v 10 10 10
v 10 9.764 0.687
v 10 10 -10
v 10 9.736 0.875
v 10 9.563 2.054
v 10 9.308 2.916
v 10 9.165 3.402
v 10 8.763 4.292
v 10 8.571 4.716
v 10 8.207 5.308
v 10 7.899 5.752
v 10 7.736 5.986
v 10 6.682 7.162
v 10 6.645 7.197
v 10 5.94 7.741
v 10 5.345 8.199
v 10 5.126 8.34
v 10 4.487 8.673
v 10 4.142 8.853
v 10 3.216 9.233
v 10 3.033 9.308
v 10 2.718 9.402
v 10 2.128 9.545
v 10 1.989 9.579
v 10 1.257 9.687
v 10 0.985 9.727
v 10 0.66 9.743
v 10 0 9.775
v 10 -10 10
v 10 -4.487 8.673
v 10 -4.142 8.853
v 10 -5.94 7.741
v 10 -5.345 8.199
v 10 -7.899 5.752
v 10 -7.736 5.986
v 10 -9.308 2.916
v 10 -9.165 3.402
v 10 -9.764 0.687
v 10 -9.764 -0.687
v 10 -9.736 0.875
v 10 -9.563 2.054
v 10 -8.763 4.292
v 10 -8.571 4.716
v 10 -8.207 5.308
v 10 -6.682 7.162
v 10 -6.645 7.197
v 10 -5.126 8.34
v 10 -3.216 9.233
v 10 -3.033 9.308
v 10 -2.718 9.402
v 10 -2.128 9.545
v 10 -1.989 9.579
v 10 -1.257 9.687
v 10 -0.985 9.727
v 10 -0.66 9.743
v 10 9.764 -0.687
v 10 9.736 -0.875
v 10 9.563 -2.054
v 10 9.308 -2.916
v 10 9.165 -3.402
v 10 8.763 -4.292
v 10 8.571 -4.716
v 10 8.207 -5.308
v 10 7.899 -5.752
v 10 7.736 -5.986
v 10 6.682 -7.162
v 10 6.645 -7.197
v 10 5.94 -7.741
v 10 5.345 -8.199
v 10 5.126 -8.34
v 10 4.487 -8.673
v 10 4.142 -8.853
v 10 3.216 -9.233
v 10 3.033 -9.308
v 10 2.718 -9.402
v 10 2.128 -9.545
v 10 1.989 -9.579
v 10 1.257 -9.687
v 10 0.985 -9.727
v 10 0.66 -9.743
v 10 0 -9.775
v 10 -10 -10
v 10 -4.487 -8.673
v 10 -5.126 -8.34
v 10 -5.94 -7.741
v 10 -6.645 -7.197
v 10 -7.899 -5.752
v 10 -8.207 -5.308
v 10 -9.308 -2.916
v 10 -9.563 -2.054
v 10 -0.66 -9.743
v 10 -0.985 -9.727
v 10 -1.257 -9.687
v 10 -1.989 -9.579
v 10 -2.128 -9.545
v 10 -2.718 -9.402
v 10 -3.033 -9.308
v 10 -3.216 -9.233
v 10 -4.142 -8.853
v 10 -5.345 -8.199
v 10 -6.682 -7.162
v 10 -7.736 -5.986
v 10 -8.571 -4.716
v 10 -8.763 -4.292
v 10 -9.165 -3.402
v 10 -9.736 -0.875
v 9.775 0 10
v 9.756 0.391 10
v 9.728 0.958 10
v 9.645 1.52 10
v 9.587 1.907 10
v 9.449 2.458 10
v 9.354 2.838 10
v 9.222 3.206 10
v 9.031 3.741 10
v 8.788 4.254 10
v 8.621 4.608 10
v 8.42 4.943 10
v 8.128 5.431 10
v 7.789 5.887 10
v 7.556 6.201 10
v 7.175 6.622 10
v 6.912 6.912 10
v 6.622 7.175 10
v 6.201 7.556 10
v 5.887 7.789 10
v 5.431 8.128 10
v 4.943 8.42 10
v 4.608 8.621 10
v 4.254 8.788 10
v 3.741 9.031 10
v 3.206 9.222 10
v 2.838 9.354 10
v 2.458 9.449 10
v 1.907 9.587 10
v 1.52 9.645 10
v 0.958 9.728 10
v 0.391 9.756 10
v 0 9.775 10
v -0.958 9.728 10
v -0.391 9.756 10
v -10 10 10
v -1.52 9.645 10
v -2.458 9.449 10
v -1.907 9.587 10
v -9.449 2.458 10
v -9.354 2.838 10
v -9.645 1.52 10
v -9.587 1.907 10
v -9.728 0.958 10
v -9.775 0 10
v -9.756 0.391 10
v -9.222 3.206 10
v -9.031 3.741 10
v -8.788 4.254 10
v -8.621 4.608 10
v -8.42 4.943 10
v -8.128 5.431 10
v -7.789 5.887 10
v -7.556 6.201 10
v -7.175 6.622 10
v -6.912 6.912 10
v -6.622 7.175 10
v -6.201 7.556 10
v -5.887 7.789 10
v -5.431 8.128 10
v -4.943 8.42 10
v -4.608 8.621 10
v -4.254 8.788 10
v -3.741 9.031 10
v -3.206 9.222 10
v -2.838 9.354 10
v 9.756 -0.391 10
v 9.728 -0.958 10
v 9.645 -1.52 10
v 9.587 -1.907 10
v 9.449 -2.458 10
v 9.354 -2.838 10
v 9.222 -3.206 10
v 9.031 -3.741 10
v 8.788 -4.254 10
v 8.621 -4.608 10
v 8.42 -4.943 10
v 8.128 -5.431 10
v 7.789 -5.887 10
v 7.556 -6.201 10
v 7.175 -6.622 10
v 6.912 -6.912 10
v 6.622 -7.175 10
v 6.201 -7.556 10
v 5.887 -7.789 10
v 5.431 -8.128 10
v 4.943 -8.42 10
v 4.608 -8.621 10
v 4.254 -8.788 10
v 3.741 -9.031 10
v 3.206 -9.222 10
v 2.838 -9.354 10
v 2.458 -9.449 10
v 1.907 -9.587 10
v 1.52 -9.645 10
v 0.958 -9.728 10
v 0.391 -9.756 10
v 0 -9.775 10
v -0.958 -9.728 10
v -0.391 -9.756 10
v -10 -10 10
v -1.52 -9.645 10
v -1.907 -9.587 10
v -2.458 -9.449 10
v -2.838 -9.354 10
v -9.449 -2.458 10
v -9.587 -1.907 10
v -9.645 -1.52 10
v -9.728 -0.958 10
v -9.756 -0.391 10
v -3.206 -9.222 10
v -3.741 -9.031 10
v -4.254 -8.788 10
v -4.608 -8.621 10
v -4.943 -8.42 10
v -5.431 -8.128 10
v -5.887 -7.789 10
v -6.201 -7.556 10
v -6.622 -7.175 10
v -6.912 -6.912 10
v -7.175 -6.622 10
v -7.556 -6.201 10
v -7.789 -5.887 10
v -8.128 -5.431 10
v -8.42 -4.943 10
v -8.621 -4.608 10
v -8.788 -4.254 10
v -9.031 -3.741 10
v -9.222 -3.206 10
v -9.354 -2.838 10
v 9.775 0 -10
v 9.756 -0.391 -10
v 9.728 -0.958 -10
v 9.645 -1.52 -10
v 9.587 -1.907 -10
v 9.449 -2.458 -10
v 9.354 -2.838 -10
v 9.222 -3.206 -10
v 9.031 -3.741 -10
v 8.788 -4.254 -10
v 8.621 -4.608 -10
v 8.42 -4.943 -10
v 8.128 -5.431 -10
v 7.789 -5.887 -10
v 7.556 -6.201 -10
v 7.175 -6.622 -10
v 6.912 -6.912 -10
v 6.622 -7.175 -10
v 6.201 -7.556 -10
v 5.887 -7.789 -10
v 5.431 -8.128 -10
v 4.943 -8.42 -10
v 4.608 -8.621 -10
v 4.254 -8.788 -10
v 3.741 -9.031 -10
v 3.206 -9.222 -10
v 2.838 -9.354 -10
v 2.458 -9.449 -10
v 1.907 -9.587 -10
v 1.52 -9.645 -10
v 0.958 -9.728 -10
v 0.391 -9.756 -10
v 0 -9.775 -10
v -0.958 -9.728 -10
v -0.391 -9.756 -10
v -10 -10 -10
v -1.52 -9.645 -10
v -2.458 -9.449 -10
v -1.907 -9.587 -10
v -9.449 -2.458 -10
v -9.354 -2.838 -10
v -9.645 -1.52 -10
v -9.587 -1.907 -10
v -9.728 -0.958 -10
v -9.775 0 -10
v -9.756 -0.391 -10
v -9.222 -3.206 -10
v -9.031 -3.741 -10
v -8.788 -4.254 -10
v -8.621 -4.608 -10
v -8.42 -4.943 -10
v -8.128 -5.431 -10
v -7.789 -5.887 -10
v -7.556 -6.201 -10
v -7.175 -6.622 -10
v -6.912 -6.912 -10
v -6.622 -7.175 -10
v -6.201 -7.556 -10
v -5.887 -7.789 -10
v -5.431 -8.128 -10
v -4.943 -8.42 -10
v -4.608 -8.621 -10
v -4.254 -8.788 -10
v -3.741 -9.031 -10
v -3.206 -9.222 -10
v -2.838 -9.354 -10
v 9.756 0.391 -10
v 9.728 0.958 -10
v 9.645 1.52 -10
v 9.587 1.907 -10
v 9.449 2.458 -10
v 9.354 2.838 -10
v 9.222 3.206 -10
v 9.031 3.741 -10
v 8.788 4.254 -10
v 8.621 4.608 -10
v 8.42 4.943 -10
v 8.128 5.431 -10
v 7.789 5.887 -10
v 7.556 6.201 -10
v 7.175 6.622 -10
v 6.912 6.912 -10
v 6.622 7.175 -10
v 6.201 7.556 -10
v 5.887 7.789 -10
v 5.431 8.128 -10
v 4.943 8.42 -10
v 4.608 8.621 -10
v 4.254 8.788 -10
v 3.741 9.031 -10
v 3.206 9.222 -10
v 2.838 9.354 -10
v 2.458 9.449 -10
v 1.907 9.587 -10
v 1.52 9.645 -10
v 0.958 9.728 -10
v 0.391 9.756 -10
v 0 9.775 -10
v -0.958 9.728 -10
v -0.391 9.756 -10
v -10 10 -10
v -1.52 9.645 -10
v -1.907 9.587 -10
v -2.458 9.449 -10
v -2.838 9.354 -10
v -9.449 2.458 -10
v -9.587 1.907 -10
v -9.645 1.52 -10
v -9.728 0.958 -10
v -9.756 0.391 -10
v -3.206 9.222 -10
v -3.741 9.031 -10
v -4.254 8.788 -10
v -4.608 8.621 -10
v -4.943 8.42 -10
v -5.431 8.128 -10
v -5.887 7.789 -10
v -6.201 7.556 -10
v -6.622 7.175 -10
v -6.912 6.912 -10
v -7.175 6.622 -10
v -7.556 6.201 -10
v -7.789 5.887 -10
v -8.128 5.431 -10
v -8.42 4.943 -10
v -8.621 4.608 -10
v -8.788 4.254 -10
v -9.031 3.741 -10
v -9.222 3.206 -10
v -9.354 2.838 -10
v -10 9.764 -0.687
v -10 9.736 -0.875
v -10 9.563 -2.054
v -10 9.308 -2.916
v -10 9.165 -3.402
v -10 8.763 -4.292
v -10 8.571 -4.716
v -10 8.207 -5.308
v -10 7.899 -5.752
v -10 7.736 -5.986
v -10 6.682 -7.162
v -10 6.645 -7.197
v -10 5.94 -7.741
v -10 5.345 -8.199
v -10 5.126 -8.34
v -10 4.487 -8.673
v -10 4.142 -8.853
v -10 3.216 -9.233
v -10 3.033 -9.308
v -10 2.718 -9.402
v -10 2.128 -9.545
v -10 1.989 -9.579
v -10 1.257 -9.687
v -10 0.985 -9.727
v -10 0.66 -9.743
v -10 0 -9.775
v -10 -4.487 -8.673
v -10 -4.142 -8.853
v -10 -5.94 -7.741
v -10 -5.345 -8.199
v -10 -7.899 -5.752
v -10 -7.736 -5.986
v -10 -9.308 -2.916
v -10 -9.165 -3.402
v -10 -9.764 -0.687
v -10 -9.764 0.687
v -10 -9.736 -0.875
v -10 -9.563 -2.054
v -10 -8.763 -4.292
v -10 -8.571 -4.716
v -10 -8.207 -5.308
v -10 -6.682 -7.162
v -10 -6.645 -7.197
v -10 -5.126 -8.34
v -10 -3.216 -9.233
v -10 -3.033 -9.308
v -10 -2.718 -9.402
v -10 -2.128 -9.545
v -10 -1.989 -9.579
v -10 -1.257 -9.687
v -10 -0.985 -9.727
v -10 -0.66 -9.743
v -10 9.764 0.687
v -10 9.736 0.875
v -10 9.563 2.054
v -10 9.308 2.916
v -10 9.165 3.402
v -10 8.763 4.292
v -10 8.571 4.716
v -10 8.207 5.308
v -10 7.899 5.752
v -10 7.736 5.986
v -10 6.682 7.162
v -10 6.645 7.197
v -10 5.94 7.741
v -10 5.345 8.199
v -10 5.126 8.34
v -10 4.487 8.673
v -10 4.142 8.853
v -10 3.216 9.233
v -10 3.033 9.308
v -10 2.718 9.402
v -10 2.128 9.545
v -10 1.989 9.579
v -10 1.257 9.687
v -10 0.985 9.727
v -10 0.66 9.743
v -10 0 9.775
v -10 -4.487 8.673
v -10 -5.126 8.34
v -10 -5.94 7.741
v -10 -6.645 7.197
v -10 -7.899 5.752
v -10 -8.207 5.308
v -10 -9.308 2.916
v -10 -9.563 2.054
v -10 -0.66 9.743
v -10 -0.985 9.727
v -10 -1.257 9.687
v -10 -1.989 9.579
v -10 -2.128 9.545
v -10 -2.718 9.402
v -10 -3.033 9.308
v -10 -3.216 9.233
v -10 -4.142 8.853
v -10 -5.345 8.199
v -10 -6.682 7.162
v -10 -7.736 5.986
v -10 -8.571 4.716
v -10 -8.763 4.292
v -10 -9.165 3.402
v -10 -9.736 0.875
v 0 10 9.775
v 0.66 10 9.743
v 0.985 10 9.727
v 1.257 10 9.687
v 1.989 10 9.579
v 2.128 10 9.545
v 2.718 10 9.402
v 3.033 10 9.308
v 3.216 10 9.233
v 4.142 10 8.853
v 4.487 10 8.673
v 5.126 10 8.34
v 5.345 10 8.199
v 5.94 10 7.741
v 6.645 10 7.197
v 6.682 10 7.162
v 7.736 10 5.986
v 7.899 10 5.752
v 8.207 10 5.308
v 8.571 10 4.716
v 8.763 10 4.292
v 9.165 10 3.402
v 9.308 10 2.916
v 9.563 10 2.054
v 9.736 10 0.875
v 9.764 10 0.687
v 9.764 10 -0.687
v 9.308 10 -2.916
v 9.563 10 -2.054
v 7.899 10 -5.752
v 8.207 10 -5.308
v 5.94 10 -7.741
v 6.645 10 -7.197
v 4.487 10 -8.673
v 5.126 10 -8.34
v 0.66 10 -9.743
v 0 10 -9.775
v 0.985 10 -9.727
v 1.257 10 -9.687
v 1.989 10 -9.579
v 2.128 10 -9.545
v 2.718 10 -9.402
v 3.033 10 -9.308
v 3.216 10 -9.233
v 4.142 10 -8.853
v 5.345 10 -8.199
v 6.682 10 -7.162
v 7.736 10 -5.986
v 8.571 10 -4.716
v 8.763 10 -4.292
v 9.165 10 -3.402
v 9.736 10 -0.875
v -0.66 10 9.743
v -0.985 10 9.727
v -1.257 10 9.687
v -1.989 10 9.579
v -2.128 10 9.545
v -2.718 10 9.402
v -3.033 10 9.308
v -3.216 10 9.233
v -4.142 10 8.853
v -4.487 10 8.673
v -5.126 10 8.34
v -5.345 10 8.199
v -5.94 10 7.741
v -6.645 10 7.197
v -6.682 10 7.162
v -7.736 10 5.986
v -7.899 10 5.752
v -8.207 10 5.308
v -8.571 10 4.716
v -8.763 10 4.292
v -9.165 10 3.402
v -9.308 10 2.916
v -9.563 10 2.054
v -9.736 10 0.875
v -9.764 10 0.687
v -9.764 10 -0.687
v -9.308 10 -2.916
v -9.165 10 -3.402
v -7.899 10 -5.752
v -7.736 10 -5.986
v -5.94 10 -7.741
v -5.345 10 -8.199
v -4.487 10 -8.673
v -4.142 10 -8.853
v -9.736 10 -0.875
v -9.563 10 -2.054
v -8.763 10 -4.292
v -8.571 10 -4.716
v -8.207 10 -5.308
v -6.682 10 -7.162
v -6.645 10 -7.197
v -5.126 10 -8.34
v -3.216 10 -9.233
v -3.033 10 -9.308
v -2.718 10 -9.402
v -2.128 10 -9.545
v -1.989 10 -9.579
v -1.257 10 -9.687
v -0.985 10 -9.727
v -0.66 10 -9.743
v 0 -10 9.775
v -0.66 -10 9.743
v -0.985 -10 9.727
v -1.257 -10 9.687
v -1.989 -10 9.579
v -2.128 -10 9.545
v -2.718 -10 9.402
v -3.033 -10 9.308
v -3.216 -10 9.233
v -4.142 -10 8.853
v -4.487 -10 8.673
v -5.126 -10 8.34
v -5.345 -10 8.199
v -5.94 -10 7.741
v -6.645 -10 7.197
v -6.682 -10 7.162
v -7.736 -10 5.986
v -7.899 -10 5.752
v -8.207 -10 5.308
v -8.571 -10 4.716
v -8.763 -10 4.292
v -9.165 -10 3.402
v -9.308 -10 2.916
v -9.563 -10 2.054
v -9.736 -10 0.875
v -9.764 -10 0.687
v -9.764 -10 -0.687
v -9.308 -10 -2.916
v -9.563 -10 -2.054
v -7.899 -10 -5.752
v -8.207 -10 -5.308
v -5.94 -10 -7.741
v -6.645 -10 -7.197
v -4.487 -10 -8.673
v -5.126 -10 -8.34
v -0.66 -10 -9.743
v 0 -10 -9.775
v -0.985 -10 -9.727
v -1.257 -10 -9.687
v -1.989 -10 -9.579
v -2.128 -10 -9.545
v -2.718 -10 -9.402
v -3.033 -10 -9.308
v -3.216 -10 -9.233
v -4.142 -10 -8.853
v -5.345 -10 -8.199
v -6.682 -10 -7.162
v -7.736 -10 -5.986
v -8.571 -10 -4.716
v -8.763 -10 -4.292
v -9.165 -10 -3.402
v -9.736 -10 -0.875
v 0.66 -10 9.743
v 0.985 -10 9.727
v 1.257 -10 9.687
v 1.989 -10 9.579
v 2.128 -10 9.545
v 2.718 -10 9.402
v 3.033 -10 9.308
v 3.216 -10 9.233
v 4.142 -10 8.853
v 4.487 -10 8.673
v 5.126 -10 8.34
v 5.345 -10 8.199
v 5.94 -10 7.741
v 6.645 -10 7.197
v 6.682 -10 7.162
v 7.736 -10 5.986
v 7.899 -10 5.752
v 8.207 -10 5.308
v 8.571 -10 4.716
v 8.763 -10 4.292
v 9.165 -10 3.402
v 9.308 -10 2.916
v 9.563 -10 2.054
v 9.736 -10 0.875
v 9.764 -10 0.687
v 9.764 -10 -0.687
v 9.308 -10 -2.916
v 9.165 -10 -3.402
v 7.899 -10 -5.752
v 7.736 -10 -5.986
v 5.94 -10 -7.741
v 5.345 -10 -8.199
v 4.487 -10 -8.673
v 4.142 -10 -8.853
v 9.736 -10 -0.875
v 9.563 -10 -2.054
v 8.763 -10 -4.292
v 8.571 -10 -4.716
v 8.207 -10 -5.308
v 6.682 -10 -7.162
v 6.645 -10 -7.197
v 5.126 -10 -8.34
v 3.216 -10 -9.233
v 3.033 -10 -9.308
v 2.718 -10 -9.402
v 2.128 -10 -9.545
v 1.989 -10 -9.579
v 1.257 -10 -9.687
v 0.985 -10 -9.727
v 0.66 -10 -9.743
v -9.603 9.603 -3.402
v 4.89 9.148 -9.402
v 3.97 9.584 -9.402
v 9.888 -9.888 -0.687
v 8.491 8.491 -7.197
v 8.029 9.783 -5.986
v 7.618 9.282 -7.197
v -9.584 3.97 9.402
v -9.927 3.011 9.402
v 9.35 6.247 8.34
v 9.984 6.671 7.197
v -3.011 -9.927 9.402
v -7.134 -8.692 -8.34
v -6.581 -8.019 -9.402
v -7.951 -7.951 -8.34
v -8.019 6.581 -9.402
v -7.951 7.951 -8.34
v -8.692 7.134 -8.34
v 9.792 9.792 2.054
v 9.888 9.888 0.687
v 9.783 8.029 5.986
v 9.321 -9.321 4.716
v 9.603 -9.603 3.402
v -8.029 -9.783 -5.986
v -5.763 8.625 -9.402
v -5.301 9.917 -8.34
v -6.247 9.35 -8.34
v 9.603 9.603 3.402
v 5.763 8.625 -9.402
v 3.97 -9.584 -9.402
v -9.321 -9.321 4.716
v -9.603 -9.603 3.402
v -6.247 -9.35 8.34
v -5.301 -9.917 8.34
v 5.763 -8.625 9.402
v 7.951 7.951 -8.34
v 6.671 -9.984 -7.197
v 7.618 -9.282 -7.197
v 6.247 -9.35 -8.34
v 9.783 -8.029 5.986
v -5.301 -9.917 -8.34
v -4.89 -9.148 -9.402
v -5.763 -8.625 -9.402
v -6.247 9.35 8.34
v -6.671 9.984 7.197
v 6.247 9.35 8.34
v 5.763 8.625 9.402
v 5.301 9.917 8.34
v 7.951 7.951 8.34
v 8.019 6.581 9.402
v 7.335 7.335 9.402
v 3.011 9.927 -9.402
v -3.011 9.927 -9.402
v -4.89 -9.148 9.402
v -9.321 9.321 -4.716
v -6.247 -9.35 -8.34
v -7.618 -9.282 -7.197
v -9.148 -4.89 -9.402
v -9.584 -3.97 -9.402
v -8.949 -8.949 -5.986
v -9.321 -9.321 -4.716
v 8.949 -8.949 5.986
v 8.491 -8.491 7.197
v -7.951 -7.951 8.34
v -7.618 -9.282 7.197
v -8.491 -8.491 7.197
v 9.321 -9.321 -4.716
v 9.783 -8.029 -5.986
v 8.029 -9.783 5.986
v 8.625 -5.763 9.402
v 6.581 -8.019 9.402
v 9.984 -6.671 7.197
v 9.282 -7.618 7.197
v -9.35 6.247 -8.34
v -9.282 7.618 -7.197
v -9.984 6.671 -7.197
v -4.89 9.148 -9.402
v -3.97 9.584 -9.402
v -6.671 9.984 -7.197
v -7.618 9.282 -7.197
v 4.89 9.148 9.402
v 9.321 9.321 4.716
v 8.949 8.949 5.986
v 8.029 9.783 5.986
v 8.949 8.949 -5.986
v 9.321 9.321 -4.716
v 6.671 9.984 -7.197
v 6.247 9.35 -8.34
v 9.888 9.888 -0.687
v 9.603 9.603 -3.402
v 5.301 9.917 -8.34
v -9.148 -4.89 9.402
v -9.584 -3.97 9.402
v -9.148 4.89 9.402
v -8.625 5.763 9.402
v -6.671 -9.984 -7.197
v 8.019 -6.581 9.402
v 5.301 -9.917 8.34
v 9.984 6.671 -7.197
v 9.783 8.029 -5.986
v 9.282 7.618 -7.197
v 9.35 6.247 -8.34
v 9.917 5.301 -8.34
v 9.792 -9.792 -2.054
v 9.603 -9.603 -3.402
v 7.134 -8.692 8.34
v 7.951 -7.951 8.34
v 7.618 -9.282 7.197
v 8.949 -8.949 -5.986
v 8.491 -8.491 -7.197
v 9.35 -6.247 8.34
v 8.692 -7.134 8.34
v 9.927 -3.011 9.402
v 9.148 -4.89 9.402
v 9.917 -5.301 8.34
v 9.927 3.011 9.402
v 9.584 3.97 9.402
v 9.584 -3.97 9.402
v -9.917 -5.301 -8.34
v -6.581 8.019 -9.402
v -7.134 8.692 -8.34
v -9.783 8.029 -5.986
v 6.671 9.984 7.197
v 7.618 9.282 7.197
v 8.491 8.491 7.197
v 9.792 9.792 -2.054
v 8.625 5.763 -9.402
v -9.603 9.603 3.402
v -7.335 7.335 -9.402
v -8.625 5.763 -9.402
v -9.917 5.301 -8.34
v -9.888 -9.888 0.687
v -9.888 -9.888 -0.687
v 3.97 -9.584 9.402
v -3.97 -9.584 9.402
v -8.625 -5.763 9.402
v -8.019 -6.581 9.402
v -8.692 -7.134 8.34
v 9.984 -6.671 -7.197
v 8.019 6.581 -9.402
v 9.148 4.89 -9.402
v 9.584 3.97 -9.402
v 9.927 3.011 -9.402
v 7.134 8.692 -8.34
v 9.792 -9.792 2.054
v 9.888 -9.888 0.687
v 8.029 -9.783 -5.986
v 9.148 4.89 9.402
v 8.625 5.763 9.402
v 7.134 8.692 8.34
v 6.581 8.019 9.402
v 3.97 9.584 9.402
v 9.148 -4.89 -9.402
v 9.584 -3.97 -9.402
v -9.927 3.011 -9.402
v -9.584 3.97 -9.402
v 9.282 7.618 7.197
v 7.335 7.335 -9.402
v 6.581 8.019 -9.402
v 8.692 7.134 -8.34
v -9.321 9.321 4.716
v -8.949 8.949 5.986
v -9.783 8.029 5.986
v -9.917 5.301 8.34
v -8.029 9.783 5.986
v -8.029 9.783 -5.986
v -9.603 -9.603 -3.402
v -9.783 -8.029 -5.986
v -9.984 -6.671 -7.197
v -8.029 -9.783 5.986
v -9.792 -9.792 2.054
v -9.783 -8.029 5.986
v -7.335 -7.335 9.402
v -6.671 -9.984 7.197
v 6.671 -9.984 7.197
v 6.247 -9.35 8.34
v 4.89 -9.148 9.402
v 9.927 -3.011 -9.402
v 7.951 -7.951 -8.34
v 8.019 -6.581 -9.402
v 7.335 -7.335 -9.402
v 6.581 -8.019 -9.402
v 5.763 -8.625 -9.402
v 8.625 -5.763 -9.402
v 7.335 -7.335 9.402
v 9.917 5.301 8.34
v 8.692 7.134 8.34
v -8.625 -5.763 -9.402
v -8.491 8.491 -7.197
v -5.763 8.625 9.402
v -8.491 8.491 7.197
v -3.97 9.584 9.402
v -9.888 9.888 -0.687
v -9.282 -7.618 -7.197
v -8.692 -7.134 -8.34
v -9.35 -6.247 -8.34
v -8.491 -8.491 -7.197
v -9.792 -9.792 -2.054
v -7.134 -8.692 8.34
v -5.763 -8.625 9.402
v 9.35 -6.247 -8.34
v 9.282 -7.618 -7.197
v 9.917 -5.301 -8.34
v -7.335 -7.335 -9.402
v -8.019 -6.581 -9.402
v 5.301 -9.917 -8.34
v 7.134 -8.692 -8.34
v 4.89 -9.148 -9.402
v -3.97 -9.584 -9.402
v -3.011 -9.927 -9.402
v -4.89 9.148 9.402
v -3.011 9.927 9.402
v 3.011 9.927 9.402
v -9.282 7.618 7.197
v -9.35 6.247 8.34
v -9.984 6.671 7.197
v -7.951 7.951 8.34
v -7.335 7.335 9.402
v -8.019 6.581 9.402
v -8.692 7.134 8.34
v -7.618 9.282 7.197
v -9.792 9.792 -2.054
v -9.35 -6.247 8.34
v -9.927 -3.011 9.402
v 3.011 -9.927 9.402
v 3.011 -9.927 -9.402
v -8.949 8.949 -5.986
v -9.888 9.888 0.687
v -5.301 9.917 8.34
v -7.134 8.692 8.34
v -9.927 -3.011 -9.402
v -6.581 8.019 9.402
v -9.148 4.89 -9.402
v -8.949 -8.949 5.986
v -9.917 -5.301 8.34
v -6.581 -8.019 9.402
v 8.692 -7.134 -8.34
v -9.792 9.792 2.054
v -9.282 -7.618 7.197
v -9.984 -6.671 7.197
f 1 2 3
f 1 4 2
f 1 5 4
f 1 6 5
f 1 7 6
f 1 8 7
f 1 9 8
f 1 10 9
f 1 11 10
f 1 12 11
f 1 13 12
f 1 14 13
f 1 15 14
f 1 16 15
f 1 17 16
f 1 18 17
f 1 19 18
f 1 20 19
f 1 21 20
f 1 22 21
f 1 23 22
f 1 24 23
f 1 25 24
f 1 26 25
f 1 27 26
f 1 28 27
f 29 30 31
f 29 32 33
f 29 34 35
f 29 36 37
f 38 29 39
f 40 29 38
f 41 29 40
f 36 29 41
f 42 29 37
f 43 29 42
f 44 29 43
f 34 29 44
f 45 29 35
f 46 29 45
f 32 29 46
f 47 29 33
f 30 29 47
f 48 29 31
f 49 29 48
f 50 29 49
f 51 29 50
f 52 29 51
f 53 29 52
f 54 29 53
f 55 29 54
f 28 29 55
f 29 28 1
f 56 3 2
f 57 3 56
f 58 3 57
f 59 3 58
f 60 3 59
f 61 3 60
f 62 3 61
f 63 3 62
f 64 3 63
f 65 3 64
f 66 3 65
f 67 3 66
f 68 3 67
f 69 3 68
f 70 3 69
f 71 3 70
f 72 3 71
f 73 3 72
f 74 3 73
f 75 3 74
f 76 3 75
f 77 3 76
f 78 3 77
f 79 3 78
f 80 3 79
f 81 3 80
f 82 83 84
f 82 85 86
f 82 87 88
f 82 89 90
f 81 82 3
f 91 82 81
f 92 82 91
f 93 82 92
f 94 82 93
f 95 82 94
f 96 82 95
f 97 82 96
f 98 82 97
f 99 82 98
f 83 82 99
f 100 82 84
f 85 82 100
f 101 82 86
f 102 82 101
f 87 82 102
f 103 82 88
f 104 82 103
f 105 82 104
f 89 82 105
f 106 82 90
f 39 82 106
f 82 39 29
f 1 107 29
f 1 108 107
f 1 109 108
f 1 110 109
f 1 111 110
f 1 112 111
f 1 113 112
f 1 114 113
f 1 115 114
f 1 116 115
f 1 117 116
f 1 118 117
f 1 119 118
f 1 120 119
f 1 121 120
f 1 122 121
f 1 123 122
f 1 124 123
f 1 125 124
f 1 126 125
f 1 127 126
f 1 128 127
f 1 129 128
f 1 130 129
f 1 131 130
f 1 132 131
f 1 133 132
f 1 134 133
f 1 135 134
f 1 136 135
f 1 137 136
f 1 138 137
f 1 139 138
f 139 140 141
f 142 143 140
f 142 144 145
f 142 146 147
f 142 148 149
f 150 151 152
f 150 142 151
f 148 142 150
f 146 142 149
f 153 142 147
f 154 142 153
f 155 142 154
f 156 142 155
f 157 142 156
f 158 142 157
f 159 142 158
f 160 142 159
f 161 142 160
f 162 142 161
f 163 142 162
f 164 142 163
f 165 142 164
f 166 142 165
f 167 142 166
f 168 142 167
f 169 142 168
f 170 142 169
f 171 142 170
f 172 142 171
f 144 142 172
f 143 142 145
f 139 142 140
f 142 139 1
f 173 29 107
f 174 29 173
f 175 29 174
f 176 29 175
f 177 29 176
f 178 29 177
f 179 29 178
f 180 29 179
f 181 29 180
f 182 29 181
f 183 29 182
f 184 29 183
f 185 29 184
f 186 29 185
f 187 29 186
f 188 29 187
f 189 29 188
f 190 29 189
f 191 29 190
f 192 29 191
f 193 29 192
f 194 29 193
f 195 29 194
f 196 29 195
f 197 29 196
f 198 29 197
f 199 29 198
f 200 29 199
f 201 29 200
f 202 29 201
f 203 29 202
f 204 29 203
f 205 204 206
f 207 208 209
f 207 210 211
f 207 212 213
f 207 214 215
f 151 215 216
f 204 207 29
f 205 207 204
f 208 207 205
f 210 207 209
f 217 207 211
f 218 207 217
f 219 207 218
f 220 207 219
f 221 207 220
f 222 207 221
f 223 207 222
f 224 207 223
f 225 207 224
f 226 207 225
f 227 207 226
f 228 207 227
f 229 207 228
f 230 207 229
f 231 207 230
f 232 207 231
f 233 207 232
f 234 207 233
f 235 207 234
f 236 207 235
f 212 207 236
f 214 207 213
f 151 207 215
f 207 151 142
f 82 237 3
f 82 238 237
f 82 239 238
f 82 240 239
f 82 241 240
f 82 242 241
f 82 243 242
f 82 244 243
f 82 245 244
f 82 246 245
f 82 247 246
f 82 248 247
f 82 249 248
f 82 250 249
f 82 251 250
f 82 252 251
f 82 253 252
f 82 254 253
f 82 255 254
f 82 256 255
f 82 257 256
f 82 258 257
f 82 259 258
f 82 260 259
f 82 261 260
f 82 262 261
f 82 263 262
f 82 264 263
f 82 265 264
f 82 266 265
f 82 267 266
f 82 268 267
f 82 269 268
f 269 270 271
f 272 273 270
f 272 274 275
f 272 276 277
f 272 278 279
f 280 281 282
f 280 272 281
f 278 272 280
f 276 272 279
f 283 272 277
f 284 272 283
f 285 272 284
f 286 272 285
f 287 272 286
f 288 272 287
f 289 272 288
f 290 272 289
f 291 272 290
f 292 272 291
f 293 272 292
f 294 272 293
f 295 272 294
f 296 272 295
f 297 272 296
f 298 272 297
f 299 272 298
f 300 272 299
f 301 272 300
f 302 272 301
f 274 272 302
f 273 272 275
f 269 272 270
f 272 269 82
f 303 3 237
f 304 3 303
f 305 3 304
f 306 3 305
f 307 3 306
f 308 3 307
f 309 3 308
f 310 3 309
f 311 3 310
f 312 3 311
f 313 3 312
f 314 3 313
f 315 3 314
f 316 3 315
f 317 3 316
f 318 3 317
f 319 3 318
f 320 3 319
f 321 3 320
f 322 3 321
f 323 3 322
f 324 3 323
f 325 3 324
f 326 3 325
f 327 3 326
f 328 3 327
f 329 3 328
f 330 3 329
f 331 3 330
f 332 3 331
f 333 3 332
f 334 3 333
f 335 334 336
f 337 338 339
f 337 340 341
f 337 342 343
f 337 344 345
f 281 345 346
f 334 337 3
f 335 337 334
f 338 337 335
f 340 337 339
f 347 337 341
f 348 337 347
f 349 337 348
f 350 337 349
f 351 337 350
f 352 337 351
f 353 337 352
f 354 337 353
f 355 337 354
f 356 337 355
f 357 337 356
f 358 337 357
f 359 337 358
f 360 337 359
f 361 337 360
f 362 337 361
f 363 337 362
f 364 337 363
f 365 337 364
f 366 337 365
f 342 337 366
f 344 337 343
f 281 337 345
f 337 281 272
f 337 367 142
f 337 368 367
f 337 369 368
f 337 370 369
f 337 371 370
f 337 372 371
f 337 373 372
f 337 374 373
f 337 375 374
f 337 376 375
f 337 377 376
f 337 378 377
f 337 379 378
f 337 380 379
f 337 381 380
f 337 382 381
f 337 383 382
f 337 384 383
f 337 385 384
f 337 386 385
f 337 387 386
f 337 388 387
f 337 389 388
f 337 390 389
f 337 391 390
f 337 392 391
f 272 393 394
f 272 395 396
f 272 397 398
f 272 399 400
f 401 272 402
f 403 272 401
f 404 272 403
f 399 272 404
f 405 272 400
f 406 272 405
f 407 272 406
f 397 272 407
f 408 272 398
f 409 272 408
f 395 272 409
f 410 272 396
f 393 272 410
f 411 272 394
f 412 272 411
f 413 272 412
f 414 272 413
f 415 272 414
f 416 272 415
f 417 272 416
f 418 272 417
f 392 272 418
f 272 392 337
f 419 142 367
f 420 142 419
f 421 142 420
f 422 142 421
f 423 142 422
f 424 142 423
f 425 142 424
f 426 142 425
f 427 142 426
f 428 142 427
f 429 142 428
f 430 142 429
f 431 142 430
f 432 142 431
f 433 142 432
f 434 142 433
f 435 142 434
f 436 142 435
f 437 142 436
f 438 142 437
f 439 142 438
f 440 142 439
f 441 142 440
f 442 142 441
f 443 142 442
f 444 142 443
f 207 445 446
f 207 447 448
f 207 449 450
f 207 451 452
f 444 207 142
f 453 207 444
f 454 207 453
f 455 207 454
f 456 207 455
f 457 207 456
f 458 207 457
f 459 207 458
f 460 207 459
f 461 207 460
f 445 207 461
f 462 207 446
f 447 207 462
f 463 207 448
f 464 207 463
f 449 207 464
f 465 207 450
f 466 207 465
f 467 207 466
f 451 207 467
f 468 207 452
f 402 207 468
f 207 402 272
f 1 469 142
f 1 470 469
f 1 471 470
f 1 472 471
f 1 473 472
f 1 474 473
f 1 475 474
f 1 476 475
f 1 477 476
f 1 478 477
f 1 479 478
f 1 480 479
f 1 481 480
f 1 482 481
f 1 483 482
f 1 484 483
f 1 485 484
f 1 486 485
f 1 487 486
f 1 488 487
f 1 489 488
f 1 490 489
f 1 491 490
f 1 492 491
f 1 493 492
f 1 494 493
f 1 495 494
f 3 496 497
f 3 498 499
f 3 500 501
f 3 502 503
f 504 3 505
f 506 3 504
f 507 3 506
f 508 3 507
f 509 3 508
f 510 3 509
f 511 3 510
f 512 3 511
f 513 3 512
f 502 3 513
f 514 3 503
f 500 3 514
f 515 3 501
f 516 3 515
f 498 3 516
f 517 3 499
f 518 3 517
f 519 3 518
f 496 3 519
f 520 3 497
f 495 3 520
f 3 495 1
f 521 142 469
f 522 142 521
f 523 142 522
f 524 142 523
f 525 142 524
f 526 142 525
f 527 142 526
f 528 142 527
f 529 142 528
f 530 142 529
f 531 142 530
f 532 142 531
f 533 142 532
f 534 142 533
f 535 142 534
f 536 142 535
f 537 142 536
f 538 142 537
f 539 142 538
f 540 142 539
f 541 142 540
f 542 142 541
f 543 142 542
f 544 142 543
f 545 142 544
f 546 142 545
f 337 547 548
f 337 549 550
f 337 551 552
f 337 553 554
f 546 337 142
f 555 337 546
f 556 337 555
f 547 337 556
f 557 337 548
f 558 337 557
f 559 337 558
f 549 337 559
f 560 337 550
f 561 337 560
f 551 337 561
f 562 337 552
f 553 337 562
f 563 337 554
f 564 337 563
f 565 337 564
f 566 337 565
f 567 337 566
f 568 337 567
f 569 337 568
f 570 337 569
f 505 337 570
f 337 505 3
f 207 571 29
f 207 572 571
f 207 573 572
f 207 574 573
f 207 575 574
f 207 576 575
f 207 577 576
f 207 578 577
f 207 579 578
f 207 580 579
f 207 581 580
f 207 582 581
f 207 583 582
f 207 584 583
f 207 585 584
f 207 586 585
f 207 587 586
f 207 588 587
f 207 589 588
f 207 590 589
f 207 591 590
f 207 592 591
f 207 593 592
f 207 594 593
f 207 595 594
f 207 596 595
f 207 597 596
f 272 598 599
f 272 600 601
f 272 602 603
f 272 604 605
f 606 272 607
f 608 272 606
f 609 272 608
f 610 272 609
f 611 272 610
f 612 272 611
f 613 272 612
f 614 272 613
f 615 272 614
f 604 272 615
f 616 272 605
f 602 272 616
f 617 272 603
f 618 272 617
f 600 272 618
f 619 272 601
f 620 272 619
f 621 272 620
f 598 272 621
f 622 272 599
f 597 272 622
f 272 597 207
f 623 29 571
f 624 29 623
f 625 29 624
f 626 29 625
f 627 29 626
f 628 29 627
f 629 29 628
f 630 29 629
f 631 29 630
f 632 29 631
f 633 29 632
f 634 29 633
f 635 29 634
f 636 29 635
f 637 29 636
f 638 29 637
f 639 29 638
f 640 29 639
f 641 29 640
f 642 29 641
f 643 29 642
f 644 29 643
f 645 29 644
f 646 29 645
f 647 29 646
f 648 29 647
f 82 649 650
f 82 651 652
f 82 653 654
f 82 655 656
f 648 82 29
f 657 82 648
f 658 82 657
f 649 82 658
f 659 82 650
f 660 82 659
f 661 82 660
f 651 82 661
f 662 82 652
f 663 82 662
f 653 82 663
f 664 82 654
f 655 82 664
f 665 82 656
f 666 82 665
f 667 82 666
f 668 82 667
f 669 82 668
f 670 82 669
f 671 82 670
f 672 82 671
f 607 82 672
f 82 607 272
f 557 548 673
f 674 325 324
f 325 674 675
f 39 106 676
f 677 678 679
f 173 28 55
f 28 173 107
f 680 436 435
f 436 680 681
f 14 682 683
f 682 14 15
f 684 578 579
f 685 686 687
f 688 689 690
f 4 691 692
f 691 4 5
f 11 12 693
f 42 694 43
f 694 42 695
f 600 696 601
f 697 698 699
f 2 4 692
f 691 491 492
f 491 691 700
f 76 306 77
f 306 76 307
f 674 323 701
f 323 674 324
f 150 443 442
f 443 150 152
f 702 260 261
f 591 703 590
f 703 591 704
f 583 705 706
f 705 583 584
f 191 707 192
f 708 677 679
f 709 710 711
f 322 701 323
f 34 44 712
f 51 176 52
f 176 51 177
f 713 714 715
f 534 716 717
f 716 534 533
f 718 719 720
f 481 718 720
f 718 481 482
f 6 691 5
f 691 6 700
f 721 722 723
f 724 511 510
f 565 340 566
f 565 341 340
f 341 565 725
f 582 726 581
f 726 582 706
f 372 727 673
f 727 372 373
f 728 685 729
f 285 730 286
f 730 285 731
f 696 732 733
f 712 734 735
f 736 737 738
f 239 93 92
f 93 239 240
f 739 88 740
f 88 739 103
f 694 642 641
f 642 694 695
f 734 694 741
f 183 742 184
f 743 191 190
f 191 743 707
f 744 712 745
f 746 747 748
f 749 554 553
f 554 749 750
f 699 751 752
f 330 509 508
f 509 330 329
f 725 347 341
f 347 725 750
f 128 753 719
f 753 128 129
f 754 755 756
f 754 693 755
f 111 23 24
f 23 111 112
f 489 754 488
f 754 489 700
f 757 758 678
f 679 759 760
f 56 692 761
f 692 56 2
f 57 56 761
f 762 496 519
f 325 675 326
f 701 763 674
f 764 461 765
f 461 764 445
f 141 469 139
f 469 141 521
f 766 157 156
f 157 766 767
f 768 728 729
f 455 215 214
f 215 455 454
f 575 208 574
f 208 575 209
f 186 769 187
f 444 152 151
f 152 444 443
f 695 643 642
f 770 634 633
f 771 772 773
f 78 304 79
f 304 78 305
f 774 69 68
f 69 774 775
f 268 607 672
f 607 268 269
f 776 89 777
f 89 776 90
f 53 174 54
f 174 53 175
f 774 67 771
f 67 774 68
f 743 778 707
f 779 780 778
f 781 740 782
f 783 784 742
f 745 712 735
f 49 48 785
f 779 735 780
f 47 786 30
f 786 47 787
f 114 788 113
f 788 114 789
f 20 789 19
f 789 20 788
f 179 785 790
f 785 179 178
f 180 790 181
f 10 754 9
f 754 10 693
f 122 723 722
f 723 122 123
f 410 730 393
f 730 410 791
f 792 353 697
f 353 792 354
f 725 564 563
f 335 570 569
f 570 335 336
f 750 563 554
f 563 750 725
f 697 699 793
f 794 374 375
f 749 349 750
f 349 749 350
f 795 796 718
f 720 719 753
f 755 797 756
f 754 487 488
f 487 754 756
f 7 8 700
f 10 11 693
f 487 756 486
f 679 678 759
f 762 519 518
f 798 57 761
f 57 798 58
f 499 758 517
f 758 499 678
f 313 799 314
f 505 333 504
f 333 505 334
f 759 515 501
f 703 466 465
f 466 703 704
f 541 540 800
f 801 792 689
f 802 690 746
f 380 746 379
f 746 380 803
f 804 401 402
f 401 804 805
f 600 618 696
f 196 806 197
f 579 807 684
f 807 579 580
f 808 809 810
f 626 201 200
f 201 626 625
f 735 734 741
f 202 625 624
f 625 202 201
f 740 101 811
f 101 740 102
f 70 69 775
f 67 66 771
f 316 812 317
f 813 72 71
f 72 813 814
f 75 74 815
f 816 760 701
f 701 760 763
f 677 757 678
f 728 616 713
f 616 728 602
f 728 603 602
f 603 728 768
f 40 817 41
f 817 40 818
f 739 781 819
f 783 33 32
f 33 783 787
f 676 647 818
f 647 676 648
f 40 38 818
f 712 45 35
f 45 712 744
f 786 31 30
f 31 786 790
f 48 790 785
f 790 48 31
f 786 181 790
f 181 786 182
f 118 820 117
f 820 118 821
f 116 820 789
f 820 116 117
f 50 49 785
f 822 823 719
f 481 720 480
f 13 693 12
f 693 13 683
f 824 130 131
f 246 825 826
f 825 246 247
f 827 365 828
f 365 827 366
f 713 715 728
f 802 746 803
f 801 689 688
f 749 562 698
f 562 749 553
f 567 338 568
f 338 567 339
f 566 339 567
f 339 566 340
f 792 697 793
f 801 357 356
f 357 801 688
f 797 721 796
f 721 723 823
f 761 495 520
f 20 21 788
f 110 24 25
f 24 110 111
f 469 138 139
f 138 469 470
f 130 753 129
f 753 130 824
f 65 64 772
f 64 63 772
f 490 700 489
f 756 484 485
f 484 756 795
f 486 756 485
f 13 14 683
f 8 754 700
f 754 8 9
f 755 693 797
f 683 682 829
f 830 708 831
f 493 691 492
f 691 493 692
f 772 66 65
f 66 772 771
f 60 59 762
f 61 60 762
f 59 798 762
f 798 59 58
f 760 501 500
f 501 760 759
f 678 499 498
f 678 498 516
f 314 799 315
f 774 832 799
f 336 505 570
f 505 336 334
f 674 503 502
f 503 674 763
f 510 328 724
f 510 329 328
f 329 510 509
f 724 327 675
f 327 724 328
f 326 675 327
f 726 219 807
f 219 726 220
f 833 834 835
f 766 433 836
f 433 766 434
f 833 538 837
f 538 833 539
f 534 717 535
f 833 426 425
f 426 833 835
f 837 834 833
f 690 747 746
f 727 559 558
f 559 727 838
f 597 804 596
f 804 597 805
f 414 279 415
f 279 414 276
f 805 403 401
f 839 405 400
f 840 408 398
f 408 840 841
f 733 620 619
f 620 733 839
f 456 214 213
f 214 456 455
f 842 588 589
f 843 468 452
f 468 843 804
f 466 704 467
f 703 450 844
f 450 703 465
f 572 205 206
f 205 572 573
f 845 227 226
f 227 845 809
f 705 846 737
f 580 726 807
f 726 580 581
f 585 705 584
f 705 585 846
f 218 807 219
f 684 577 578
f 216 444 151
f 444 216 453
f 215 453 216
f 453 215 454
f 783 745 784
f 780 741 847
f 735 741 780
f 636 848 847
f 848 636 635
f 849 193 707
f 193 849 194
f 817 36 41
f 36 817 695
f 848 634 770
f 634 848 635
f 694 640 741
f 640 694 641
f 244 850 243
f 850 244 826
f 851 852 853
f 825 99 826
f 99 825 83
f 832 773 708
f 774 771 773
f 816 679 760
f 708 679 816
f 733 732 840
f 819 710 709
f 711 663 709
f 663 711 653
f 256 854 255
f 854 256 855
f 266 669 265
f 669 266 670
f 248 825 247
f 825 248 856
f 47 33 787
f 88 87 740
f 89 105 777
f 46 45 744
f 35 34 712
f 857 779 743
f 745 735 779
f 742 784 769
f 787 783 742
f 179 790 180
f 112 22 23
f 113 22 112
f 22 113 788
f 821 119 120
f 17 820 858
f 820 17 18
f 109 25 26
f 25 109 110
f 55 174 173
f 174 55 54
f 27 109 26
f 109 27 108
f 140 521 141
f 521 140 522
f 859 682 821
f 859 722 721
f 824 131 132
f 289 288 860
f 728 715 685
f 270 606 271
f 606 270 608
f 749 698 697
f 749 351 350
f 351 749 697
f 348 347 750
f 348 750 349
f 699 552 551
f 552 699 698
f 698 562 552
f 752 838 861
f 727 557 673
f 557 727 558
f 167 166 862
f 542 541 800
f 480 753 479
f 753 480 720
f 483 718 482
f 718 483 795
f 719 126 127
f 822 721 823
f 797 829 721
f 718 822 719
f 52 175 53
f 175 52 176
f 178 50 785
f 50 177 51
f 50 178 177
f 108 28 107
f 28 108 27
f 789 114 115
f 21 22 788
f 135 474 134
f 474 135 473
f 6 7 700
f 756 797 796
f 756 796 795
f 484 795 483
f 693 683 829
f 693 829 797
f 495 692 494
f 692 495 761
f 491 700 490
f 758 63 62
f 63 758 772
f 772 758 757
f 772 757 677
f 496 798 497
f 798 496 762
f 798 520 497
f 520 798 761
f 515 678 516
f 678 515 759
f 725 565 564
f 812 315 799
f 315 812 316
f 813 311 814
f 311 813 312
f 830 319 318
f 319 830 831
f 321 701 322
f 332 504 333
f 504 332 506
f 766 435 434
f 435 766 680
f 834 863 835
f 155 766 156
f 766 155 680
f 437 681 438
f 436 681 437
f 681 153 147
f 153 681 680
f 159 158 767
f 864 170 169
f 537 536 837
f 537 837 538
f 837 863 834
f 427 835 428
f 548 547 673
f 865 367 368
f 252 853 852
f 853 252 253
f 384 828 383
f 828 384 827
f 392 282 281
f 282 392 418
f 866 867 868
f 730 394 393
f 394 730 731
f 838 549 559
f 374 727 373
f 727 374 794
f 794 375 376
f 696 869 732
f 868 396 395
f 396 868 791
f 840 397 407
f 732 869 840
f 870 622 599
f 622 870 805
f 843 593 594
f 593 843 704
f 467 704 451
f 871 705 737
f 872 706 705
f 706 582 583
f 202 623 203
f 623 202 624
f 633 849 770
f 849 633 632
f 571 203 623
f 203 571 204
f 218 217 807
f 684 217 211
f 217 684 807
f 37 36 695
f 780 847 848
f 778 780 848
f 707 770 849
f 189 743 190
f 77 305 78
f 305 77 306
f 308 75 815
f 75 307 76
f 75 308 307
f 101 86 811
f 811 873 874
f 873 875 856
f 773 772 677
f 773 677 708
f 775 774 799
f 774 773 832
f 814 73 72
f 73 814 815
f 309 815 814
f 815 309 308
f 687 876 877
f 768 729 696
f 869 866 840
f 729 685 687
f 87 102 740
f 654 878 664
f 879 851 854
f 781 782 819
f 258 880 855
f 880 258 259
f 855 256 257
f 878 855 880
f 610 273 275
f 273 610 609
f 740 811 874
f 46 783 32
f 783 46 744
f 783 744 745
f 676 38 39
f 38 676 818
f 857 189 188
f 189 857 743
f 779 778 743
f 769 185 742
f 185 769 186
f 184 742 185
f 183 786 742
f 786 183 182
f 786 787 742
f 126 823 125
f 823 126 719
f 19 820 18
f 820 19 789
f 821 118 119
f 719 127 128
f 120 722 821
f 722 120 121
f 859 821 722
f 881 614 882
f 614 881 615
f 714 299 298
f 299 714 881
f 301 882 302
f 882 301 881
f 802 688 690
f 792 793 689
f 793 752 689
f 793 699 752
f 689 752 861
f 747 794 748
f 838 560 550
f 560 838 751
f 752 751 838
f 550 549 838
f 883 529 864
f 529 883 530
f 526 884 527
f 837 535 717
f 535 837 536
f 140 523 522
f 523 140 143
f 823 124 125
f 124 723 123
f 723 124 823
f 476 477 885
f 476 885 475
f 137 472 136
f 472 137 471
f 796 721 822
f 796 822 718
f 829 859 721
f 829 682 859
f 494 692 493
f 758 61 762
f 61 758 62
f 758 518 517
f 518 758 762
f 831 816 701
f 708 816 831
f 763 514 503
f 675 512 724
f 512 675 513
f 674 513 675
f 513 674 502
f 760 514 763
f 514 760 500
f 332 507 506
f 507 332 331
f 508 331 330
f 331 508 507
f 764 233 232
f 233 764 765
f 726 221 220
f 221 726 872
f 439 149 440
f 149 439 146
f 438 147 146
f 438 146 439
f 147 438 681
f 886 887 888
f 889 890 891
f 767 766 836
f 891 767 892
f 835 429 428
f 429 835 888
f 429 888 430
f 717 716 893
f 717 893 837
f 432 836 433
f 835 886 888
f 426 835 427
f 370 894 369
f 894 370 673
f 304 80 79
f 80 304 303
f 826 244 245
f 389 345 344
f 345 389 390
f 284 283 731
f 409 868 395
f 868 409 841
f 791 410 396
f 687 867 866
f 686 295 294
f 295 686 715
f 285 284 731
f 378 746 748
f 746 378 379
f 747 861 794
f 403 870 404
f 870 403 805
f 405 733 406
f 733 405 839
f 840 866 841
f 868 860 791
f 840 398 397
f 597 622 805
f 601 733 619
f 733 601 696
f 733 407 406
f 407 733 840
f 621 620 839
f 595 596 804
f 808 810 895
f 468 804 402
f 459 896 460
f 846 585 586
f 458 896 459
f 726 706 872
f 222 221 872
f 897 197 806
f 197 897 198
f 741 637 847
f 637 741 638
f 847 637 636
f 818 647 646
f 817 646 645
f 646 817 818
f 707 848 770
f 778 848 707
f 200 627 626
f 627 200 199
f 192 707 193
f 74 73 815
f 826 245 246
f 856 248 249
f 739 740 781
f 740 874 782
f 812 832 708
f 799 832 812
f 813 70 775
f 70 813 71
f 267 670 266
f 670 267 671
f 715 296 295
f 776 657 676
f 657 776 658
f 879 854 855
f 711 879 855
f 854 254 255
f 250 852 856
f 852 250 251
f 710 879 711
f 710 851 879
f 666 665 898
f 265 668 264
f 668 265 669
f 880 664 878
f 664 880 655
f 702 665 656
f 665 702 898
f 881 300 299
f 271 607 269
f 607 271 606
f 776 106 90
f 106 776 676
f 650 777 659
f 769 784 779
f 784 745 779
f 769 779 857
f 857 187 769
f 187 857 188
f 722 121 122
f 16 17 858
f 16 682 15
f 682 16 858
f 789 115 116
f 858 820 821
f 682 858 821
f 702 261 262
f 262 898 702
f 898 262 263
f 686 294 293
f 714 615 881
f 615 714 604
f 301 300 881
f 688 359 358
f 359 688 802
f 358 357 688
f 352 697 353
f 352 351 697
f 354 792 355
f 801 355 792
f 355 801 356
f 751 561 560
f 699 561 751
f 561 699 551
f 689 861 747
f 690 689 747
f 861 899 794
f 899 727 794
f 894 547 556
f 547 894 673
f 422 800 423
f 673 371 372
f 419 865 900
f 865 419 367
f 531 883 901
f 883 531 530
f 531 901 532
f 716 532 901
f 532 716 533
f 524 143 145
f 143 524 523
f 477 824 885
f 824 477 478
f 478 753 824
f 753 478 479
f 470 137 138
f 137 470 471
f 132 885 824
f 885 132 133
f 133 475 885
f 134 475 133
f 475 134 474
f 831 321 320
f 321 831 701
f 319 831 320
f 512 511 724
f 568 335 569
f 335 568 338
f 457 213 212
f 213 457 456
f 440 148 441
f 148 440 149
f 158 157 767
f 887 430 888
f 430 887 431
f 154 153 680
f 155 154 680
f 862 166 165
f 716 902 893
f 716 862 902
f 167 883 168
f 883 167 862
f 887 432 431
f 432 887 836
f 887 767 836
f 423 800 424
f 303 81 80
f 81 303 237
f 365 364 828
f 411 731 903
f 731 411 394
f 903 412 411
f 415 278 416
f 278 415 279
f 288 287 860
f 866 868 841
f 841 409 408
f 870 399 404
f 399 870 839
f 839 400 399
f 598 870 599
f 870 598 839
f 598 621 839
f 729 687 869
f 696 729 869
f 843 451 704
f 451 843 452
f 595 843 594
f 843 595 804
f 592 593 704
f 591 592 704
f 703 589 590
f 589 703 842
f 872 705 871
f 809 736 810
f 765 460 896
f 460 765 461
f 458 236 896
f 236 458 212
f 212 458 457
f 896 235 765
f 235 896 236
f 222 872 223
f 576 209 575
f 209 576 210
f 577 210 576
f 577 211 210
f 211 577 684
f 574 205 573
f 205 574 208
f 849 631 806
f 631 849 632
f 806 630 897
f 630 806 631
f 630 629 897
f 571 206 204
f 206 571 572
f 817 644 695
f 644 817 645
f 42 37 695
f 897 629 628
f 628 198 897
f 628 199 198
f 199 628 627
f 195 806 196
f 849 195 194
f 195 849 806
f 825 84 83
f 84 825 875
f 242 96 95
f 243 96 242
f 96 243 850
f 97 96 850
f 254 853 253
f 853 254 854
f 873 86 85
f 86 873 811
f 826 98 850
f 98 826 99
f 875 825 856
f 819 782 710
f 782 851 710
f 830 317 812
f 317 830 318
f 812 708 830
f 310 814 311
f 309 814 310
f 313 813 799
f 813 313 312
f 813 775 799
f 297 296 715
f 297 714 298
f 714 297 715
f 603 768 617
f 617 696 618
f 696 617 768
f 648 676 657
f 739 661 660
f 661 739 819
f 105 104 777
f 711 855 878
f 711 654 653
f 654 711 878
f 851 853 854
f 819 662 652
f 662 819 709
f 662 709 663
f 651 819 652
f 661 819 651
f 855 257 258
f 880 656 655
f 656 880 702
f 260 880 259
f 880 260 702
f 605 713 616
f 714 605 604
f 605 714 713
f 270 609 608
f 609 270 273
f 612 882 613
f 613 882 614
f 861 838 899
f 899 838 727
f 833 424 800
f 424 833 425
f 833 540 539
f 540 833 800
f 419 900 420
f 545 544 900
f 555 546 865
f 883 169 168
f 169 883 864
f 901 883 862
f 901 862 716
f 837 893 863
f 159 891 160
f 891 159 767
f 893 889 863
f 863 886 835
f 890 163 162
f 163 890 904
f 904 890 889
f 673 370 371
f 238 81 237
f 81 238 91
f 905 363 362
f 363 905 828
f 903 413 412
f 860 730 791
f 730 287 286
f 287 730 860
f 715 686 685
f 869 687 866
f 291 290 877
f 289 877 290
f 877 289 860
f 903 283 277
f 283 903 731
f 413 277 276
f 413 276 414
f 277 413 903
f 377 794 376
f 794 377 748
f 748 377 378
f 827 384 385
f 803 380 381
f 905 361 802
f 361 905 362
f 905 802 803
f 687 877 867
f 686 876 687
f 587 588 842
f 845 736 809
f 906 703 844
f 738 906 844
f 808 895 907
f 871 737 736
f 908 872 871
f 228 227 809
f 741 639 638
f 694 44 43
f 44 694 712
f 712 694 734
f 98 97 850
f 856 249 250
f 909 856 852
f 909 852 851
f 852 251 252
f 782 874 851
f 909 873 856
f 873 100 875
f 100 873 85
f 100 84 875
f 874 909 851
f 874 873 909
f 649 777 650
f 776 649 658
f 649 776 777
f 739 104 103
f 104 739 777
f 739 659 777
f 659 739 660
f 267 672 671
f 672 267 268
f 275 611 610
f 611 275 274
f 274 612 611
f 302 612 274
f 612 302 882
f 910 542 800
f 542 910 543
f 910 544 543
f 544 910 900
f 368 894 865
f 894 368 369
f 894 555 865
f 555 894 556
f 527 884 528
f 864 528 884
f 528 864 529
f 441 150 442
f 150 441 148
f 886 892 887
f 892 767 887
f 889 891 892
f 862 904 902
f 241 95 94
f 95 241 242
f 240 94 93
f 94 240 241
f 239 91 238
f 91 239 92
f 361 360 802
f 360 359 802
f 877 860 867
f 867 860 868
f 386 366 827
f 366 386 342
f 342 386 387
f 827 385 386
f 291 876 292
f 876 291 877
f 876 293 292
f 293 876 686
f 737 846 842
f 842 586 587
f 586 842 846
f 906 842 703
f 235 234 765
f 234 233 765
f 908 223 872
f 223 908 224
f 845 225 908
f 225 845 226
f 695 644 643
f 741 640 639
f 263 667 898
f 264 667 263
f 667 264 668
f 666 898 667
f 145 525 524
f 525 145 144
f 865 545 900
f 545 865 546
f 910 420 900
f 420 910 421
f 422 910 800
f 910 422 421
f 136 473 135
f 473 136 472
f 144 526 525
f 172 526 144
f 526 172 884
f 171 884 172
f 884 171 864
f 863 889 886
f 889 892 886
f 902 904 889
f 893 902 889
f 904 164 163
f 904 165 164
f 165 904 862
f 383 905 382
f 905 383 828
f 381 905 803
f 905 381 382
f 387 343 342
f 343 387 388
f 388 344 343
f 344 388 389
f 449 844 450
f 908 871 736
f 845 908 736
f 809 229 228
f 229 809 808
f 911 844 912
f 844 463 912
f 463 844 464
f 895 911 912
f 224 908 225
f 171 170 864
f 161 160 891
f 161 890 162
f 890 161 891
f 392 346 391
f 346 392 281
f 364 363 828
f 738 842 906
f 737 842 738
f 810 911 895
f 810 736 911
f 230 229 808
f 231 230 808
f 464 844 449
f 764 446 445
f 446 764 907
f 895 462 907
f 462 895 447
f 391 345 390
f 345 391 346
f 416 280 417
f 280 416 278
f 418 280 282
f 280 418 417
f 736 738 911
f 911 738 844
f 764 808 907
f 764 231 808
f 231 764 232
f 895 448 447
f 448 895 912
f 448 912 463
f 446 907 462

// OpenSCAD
difference() {
  cube([20,20,20], center=true);
  sphere(r=14, $fn=64);
}
